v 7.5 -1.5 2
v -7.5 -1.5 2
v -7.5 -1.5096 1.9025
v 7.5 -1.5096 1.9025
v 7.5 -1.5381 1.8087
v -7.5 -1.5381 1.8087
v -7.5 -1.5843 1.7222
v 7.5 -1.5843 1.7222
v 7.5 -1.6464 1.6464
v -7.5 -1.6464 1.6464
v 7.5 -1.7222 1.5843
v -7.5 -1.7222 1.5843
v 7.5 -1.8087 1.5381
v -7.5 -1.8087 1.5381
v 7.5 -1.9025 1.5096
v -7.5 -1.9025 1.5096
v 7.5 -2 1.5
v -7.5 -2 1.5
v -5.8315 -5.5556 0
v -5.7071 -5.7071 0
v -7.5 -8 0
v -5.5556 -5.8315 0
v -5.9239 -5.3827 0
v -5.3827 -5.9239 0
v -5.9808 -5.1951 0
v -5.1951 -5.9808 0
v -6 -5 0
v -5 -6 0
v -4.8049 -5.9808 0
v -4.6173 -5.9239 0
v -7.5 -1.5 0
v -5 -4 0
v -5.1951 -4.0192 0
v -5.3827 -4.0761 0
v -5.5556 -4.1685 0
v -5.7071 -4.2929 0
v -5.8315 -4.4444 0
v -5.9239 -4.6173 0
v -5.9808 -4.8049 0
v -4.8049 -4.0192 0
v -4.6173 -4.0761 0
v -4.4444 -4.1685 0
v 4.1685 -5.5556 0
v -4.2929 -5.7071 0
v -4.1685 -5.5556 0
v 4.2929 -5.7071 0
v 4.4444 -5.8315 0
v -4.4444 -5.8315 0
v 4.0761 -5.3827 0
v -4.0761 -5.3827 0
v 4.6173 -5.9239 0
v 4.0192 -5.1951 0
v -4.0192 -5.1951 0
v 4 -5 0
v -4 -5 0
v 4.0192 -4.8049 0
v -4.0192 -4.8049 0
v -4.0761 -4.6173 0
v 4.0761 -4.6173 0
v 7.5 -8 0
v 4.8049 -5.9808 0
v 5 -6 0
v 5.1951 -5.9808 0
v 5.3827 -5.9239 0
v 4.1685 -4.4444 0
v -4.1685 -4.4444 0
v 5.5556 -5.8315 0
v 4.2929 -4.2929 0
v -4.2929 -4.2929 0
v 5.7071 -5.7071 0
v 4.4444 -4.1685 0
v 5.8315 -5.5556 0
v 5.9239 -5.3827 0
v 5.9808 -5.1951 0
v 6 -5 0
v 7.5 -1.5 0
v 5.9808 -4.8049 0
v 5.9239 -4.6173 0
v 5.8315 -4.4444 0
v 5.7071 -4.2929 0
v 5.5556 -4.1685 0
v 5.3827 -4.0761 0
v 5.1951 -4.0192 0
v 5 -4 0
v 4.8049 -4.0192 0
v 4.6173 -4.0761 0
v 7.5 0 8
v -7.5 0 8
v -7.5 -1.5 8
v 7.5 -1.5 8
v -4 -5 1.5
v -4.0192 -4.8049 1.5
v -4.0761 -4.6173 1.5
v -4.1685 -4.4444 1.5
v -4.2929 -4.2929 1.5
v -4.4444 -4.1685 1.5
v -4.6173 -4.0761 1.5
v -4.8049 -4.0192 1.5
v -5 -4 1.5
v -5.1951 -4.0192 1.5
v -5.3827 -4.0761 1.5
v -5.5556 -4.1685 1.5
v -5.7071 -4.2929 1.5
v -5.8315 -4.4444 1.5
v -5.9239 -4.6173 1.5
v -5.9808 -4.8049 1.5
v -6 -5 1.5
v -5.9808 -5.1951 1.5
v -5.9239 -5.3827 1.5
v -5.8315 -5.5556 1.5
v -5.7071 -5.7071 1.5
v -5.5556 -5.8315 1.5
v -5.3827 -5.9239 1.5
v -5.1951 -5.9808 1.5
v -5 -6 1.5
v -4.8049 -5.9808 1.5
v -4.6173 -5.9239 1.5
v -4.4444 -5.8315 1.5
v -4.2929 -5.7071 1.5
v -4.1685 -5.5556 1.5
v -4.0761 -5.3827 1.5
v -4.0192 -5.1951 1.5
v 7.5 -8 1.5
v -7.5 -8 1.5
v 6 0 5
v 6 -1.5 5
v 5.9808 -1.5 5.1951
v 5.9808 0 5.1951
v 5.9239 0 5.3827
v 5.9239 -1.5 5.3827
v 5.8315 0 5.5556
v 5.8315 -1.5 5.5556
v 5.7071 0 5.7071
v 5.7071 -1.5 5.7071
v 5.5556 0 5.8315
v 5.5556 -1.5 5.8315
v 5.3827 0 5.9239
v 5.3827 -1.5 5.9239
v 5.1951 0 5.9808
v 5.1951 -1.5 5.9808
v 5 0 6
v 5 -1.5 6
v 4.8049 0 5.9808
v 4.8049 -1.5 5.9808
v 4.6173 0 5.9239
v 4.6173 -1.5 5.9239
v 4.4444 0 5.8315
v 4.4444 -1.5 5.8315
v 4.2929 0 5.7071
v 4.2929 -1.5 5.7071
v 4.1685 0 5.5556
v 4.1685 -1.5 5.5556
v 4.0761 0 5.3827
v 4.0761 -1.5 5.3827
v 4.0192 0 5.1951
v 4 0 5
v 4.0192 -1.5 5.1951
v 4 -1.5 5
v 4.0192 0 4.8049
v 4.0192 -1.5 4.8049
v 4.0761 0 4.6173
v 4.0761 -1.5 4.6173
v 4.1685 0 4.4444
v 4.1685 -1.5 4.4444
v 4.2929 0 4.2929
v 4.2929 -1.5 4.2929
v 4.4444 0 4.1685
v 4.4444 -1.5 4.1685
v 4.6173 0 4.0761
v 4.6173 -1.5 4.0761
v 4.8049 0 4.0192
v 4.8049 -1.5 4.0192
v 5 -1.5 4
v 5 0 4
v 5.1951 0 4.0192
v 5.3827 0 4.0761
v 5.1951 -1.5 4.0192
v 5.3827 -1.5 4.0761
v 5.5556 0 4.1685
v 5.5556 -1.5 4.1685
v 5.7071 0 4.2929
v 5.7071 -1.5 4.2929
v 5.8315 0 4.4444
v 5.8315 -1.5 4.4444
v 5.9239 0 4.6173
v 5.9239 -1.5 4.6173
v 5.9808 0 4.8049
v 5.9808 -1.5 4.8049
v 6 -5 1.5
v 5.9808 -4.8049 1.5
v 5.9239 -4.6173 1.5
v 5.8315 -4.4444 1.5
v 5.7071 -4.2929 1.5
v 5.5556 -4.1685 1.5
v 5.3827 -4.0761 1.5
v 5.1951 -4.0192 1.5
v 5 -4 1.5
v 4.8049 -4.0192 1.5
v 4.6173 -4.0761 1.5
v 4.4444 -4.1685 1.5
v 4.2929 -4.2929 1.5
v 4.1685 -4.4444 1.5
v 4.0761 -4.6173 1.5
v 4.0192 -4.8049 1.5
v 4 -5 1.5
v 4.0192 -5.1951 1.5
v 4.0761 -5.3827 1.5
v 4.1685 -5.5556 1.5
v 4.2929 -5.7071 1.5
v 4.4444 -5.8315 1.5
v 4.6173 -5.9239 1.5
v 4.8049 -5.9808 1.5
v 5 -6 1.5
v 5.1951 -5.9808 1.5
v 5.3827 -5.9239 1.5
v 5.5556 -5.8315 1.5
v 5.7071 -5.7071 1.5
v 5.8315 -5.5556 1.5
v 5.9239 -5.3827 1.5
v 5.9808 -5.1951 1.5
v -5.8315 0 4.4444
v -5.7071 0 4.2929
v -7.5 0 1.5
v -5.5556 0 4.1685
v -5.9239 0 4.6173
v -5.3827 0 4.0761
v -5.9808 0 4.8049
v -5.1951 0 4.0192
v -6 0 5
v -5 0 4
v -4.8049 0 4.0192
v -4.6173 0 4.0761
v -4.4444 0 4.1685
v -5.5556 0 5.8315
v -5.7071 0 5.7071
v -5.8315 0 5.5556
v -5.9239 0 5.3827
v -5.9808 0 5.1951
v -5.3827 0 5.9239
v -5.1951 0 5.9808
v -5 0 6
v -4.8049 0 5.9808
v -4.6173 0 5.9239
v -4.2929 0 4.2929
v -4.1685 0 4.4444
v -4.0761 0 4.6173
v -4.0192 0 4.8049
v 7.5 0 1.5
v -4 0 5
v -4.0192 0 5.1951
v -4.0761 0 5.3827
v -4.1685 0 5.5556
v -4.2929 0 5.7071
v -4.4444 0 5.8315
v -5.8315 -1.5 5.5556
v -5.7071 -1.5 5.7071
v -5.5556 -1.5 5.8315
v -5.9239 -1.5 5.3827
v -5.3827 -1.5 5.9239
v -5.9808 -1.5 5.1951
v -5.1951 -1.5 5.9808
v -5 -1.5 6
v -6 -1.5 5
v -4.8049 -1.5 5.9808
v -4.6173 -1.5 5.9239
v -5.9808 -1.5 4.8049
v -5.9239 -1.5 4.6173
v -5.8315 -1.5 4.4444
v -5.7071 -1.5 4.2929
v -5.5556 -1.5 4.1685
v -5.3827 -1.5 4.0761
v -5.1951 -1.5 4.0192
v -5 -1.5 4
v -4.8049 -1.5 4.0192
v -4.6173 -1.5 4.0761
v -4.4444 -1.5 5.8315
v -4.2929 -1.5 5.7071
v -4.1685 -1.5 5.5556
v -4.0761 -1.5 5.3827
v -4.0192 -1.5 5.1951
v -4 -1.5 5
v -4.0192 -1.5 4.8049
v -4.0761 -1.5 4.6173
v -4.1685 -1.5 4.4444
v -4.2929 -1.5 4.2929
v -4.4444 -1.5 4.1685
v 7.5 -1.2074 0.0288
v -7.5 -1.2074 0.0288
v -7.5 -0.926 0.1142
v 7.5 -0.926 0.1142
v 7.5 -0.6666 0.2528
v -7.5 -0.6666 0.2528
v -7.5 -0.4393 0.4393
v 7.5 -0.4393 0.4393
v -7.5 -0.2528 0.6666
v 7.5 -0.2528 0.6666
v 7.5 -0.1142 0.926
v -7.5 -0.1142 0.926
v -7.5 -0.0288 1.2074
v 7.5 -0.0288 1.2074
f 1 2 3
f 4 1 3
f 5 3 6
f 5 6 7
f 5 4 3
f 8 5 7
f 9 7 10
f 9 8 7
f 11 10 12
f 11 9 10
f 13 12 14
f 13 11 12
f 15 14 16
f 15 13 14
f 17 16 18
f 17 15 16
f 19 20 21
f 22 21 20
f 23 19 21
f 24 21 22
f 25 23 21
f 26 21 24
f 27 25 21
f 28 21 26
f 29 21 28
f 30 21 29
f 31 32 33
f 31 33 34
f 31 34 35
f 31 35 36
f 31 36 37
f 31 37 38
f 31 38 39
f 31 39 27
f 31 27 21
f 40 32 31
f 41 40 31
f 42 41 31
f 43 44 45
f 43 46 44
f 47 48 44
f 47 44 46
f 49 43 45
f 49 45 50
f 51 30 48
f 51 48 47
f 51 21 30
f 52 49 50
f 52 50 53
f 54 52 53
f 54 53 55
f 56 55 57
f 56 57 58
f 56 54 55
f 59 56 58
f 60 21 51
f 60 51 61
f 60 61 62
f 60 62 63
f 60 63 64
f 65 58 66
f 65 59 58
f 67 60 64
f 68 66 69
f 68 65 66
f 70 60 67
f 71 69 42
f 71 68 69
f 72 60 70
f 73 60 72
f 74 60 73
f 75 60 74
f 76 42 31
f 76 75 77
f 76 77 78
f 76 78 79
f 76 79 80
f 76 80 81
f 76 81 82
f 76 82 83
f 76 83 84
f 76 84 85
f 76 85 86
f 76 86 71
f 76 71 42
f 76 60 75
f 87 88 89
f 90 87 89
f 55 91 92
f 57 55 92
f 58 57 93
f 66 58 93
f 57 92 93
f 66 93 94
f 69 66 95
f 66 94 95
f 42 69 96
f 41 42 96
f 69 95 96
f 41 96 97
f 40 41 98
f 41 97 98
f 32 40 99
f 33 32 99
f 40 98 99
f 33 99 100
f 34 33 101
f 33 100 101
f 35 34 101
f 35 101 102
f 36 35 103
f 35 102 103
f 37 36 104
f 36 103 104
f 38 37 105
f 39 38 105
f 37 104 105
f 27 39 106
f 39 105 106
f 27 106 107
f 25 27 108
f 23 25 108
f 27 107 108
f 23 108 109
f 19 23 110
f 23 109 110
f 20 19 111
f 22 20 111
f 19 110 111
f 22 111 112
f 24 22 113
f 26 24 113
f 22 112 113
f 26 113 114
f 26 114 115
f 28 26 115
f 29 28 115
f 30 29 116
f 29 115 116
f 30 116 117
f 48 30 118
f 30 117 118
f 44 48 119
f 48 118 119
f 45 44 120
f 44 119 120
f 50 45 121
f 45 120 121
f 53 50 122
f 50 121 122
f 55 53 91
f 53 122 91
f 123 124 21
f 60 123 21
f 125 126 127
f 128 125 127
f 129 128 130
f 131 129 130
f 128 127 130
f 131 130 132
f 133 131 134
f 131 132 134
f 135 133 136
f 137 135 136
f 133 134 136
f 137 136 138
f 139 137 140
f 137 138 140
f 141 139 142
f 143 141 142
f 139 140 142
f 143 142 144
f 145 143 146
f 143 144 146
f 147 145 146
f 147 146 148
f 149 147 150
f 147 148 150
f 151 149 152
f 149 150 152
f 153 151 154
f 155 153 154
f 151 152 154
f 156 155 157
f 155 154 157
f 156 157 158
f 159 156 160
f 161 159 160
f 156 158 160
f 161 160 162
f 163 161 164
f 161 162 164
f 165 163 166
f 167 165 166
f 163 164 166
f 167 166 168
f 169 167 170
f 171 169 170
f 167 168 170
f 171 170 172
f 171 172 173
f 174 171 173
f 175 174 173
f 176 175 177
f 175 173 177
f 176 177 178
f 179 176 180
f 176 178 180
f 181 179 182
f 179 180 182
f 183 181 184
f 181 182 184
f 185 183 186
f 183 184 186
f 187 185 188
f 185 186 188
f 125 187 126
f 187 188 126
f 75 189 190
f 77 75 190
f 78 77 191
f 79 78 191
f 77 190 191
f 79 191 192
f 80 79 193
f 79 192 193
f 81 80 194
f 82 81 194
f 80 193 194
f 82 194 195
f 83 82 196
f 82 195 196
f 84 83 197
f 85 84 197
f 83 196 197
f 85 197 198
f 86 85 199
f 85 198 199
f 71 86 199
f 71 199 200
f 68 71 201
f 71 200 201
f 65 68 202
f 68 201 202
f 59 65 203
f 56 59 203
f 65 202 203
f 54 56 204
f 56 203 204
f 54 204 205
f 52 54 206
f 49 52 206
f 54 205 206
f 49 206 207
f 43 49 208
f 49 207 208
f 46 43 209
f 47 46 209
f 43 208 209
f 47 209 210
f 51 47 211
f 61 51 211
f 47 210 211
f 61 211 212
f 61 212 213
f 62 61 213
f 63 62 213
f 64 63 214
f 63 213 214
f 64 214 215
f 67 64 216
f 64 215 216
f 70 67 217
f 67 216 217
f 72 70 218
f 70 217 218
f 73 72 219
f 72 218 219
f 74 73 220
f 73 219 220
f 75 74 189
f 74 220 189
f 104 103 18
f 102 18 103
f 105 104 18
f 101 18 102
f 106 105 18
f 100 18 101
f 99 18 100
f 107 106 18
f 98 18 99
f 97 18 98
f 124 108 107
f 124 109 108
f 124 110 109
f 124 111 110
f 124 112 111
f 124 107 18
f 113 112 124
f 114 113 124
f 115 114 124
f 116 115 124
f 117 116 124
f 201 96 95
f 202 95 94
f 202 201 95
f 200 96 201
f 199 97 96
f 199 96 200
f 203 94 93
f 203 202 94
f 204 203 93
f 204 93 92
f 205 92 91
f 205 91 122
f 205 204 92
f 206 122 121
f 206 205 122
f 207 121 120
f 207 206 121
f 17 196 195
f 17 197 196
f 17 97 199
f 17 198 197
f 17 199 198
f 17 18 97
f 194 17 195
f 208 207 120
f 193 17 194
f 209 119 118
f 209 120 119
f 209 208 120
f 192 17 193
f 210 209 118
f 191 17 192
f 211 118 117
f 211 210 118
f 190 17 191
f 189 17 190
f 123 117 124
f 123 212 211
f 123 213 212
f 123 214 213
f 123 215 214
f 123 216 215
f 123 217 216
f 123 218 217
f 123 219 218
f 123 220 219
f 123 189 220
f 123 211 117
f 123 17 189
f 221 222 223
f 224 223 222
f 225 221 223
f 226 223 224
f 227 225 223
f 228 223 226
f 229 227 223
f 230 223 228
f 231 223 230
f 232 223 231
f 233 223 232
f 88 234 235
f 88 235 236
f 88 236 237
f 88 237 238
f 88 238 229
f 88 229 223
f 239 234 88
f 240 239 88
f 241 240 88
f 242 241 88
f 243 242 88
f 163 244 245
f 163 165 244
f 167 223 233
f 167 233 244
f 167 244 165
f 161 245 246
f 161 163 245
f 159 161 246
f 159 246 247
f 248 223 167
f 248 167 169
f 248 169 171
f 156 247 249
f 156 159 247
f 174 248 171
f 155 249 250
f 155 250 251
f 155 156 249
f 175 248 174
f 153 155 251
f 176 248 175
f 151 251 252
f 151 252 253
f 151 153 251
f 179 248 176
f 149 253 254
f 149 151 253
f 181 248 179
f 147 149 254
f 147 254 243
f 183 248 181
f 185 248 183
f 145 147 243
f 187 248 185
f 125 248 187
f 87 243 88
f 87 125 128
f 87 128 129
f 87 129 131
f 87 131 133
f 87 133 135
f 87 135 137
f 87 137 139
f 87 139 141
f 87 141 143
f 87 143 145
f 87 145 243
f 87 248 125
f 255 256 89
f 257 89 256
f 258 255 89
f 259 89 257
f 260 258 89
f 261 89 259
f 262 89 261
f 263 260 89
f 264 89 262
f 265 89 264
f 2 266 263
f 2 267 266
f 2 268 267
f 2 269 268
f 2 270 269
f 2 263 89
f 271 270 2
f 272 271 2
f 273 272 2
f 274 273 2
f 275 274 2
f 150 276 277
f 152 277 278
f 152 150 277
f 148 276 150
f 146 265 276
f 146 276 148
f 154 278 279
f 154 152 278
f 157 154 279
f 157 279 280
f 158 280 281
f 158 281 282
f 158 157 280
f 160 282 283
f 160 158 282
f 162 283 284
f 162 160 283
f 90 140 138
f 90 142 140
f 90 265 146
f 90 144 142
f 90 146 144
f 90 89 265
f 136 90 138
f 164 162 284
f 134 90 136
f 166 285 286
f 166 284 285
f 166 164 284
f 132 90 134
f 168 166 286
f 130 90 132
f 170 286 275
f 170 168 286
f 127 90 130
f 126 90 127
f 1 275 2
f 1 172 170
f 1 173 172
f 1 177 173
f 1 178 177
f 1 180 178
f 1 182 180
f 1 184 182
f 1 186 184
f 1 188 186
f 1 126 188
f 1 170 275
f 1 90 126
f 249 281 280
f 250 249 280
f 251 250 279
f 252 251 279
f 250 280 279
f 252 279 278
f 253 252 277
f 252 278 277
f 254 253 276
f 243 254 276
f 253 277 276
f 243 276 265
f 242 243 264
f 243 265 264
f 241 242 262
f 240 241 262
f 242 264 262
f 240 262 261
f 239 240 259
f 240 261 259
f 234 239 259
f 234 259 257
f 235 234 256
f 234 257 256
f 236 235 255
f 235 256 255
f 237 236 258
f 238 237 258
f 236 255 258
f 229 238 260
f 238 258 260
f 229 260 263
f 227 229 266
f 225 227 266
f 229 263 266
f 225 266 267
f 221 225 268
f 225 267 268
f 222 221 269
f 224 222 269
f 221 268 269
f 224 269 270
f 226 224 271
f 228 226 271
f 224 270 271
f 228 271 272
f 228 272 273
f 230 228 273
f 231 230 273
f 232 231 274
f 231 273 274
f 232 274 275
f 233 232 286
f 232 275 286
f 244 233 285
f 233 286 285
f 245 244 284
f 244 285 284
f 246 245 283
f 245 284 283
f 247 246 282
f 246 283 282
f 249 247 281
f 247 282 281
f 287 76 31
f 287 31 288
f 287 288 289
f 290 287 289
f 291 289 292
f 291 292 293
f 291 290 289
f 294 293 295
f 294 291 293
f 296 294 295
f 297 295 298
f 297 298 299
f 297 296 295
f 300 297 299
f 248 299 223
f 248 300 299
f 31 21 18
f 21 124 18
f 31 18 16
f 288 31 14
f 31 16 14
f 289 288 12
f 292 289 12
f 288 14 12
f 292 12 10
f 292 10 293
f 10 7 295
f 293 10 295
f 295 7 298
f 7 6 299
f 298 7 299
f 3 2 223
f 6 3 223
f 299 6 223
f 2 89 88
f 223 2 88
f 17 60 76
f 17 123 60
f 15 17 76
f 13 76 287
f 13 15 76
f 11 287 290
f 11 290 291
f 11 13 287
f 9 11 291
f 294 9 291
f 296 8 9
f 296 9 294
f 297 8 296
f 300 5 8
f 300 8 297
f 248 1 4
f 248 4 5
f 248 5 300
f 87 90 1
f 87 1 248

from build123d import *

# Parameters (mm, degrees)
F1_DEPTH = 7.5
F3_R     = 1
F4_DEPTH = 1.5
F2_R     = 1
F5_DEPTH = 1.5


with BuildPart() as f1:
    # F0 (on Right) → F1 (new body, symmetric)
    with BuildSketch(Plane.YZ):
        with BuildLine():
            Line((-8, 0), (-1.5, 0))
            ThreePointArc((-1.5, 0), (-0.43934, 0.43934), (0, 1.5))
            Line((0, 1.5), (0, 8))
            Line((0, 8), (-1.5, 8))
            Line((-1.5, 8), (-1.5, 2))
            ThreePointArc((-1.5, 2), (-1.646447, 1.646447), (-2, 1.5))
            Line((-2, 1.5), (-8, 1.5))
            Line((-8, 1.5), (-8, 0))
        make_face()
    extrude(amount=F1_DEPTH, both=True)

    # F3 (on face) → F4 (cut)
    with BuildSketch(Plane.XZ.offset(1.5)):
        with Locations((-5, 5)):
            Circle(F3_R)
        with Locations((5, 5)):
            Circle(F3_R)
    extrude(amount=-F4_DEPTH, mode=Mode.SUBTRACT)

    # F2 (on face) → F5 (cut)
    with BuildSketch(Plane.XY.offset(1.5)):
        with Locations((5, -5)):
            Circle(F2_R)
        with Locations((-5, -5)):
            Circle(F2_R)
    extrude(amount=-F5_DEPTH, mode=Mode.SUBTRACT)


solid = f1.part
